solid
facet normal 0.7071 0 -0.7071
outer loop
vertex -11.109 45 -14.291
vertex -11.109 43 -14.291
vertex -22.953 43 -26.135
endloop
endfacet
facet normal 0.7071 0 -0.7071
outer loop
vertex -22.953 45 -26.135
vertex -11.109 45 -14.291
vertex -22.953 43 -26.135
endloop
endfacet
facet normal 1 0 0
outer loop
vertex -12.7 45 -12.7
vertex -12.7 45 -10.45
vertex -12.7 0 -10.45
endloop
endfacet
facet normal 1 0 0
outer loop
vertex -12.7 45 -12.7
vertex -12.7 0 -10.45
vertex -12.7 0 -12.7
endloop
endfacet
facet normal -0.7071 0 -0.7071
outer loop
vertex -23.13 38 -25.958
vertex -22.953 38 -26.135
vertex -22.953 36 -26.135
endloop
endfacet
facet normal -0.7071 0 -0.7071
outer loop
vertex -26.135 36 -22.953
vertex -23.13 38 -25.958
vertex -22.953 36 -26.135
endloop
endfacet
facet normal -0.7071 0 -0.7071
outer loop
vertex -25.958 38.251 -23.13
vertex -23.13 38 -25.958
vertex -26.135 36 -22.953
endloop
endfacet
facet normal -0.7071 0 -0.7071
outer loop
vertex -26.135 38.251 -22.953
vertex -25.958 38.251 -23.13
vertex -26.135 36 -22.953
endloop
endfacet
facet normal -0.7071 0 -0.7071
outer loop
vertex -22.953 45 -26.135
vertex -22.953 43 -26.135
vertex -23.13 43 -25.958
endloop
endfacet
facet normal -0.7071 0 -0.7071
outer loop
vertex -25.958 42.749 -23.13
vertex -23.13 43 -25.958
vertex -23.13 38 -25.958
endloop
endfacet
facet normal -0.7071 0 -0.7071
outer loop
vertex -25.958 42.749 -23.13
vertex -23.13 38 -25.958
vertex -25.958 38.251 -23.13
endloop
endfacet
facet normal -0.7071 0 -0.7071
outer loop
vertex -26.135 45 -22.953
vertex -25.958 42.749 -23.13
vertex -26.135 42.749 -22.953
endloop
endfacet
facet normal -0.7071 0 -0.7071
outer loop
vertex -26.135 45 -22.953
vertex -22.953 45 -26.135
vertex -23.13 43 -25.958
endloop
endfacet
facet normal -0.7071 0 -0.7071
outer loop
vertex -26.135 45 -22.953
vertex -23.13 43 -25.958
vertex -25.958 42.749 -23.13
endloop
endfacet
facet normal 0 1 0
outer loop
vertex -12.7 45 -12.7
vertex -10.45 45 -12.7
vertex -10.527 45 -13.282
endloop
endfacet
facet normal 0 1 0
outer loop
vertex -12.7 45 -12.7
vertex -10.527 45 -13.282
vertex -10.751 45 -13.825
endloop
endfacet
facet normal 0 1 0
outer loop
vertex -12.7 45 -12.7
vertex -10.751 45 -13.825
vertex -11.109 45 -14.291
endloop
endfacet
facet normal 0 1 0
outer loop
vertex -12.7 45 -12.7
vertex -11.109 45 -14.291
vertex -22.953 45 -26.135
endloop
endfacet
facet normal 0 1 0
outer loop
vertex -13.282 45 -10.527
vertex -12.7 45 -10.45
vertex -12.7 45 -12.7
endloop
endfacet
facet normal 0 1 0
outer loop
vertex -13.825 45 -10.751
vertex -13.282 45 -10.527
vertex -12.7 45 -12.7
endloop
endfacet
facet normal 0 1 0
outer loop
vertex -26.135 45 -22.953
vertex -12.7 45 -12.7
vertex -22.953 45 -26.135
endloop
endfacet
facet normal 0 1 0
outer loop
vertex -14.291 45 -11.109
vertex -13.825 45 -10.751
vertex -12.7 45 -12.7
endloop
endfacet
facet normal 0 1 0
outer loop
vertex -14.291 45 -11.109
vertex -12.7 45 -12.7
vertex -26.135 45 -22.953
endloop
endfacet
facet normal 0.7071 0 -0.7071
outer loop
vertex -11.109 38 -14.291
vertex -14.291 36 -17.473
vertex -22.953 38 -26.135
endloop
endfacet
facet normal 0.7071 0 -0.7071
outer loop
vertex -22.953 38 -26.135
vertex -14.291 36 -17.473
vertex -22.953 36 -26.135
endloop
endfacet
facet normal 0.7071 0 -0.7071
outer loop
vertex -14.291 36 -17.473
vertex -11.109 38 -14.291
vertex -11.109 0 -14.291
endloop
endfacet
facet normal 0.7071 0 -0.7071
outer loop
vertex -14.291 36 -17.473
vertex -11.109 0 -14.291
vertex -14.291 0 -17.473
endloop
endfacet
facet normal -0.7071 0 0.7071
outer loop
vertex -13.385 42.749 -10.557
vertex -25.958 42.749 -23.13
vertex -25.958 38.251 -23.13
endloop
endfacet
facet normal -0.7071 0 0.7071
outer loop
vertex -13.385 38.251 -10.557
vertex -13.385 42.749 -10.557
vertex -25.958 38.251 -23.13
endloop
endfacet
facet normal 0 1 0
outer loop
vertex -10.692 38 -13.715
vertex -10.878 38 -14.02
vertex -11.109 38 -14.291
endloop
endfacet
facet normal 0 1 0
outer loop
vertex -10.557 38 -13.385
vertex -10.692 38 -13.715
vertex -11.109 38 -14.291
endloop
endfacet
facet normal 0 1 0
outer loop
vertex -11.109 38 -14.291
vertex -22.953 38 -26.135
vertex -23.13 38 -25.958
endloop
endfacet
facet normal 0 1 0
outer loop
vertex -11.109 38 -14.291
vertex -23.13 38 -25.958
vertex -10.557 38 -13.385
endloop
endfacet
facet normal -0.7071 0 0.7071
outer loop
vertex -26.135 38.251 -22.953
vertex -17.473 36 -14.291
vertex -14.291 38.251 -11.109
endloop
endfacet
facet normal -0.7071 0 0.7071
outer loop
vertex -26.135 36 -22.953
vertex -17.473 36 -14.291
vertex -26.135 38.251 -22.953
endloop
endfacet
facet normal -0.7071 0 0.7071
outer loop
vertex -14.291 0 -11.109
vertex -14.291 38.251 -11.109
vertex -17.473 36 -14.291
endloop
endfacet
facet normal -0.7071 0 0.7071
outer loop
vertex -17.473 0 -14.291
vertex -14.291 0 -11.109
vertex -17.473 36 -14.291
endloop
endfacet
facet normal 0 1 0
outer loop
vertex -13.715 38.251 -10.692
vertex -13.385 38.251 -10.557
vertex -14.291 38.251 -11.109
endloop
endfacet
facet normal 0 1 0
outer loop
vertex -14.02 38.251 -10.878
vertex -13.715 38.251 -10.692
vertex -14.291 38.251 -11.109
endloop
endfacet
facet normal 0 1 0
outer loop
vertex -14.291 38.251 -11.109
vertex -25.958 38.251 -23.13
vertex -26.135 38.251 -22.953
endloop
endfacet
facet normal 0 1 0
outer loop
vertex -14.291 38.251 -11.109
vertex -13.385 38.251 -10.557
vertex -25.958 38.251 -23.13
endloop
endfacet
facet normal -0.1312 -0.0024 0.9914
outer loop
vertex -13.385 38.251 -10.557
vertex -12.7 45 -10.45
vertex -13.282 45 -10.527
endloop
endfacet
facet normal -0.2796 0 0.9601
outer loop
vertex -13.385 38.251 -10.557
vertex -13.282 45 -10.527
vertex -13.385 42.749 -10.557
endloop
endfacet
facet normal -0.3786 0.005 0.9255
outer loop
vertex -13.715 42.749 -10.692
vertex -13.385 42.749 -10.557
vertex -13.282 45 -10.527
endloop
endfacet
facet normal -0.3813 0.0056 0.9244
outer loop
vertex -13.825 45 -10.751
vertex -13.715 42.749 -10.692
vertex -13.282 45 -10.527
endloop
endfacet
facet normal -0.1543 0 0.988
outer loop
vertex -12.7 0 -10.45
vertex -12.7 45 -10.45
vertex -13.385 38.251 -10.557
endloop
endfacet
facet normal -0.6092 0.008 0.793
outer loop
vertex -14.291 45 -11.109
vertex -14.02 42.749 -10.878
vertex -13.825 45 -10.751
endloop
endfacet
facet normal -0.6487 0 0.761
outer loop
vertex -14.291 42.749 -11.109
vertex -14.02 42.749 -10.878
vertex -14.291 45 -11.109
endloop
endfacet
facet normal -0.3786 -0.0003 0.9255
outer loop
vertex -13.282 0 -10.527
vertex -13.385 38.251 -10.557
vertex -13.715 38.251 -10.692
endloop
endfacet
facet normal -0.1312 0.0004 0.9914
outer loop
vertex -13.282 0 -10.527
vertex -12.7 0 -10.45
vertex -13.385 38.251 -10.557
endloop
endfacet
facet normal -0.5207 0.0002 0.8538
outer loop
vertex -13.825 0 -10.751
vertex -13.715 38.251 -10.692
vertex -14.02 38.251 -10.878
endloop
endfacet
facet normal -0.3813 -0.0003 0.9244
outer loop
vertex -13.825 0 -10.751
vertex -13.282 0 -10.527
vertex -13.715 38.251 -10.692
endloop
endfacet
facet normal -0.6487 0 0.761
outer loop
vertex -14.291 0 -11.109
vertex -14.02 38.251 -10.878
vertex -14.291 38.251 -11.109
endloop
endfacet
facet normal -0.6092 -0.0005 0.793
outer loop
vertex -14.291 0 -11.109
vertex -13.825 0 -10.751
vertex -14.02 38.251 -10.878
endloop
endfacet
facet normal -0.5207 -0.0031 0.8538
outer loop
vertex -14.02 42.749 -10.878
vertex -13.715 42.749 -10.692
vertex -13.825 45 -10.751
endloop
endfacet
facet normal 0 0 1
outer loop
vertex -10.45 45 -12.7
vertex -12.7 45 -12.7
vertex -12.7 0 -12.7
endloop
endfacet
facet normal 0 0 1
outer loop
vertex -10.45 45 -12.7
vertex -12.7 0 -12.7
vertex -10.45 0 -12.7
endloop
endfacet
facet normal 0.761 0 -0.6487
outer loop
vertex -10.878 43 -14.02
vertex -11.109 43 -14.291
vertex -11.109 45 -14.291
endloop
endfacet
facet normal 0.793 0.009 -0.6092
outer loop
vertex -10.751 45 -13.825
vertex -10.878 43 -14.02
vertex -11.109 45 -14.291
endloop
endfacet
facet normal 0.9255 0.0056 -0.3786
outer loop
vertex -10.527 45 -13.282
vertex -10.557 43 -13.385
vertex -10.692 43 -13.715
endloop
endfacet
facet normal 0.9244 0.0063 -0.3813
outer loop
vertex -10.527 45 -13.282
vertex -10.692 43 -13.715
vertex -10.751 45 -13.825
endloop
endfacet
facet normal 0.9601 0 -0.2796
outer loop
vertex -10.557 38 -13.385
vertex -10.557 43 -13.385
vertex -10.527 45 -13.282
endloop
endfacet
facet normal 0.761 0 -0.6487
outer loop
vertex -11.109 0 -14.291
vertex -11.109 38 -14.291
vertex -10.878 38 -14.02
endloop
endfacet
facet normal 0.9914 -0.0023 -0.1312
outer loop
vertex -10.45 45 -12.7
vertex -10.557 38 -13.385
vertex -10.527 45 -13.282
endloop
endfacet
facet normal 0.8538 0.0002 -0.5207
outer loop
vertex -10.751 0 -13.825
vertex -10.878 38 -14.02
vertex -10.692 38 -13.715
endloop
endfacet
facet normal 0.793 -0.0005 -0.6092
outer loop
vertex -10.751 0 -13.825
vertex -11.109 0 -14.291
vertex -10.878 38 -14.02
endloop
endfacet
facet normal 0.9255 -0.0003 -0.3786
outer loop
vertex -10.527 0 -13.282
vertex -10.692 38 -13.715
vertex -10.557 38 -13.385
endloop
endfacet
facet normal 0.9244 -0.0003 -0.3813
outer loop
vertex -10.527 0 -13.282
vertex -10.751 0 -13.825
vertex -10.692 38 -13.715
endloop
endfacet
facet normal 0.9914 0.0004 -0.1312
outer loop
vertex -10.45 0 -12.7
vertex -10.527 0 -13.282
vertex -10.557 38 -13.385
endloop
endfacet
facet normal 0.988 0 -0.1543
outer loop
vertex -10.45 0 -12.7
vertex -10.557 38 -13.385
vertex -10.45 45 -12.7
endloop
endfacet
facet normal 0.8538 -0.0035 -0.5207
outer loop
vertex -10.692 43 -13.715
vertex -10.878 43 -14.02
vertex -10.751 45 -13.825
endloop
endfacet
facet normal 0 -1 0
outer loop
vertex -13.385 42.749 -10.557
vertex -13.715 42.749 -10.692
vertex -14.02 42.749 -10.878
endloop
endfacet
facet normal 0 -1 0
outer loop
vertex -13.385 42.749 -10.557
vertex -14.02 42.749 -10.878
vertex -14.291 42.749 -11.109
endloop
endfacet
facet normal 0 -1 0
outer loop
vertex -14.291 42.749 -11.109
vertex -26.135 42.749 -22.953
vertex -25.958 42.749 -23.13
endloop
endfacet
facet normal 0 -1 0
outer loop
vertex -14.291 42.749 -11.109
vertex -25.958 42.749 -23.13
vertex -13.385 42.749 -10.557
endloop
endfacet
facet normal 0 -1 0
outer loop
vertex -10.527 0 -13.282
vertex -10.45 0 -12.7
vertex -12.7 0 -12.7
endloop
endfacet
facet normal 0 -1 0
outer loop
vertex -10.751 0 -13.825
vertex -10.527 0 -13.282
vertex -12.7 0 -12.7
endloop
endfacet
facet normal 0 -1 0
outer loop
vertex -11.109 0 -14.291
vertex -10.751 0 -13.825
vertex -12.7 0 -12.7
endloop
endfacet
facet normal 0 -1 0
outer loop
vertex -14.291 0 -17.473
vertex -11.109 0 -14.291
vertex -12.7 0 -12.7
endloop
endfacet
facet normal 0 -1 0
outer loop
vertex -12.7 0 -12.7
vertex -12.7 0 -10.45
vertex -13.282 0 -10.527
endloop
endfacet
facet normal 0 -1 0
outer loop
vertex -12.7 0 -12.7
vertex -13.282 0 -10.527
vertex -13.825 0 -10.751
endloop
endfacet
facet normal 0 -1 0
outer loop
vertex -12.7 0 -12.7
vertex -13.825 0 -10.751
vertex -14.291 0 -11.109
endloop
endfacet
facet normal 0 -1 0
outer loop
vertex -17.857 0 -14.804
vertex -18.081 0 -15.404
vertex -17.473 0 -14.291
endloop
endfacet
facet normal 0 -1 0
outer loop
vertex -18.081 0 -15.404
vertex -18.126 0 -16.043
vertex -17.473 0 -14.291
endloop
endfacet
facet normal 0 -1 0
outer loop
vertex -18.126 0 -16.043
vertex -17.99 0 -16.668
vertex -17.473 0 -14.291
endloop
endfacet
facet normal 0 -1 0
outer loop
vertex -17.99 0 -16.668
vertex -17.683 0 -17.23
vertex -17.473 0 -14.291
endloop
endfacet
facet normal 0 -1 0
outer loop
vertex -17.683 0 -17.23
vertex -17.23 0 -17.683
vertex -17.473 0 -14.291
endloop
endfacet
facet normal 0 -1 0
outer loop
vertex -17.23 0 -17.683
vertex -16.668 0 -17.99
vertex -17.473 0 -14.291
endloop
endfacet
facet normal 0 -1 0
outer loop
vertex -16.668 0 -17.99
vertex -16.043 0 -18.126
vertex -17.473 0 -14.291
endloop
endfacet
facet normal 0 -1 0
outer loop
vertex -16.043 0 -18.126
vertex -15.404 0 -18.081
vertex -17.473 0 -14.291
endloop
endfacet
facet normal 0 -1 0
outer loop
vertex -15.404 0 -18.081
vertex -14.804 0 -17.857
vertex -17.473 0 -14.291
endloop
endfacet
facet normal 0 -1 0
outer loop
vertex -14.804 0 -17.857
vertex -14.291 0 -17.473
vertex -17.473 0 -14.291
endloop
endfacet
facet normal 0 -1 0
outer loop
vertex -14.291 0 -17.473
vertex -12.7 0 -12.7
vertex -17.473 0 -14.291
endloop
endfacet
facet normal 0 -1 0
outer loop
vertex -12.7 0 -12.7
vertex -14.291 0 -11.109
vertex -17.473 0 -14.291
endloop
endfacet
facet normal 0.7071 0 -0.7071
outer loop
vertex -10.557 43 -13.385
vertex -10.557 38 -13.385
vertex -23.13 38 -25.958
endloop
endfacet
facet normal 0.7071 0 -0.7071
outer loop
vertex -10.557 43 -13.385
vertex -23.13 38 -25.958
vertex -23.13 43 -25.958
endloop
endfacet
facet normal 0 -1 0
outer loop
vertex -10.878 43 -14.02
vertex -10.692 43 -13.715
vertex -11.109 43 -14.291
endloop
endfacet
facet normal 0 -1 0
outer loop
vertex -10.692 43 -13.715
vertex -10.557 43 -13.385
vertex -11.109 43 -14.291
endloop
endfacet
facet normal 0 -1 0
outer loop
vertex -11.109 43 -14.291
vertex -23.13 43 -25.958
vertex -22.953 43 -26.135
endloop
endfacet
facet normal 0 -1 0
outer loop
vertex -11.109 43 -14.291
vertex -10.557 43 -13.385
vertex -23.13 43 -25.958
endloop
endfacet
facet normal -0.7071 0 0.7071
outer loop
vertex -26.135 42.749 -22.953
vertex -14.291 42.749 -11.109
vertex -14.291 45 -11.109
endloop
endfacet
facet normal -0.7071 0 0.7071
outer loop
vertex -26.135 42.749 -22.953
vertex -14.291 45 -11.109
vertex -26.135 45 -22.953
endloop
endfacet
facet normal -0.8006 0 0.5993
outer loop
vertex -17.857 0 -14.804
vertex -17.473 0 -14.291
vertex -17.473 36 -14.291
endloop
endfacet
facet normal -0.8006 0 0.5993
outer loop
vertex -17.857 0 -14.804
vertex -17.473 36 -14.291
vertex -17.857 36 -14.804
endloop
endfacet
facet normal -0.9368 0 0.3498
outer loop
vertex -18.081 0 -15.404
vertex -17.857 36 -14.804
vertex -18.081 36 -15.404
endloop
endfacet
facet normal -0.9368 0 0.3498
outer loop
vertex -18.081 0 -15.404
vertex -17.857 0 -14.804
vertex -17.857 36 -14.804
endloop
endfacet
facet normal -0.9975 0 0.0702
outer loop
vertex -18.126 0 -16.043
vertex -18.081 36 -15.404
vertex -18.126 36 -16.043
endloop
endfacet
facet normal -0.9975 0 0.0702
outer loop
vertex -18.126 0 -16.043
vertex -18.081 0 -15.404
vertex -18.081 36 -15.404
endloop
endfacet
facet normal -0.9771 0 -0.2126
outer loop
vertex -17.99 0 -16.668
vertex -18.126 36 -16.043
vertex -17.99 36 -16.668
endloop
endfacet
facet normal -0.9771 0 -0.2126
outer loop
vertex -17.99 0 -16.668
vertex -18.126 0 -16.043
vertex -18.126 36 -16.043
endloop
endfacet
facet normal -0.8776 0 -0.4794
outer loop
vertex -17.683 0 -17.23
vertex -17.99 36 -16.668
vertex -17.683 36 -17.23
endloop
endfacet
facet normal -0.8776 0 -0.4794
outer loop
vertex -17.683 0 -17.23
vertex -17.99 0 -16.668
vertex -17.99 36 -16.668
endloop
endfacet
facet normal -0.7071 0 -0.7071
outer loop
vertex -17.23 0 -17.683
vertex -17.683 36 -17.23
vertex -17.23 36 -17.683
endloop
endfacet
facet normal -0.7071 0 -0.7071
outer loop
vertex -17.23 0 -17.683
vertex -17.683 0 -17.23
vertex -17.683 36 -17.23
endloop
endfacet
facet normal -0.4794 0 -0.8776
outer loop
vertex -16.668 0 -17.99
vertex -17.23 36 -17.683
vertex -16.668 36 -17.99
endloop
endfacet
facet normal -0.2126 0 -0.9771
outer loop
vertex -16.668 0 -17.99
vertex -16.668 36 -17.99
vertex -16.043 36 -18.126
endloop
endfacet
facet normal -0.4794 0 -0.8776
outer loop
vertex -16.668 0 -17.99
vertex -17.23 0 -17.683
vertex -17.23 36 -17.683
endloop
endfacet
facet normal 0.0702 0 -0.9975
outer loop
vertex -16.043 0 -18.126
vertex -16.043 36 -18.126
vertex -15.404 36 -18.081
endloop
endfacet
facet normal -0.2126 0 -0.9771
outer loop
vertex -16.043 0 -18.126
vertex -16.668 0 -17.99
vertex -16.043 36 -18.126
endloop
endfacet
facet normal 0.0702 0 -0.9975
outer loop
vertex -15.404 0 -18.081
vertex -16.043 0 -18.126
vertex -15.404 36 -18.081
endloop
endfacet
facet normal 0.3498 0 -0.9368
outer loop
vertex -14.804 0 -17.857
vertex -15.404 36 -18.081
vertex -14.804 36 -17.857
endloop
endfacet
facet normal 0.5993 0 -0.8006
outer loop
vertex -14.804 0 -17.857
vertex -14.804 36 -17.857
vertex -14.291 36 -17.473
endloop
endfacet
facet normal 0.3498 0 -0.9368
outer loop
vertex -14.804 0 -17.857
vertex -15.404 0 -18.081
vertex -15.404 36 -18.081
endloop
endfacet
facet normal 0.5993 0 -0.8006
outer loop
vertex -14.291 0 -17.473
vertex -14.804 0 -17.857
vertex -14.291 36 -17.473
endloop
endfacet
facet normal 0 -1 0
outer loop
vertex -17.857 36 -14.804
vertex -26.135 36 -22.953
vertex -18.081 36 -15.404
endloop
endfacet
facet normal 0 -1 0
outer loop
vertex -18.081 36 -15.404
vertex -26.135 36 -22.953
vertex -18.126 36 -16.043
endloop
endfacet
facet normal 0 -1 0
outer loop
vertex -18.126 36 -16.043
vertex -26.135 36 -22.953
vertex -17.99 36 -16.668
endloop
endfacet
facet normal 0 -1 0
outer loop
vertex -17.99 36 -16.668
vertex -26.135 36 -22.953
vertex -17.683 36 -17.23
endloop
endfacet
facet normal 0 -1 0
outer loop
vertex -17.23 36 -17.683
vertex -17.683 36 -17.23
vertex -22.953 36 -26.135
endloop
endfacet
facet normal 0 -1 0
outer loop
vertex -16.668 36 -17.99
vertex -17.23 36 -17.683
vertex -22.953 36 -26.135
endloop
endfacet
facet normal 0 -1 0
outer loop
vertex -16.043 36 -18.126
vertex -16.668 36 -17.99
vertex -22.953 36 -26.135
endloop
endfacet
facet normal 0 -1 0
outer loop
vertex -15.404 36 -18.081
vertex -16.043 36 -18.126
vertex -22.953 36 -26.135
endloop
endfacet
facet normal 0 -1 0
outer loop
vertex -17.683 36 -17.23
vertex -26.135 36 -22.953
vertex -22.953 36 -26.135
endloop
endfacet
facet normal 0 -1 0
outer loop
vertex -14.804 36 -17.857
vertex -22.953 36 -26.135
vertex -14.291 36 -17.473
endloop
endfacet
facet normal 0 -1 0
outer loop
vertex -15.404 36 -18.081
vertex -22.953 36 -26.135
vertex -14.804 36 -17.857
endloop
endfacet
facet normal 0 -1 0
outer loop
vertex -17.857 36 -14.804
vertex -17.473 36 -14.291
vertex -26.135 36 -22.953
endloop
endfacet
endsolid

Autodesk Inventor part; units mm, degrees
ref_plane "YZ Plane" through (0, 0, 0) normal (1, 0, 0) x (0, 1, 0)
ref_plane "XZ Plane" through (0, 0, 0) normal (0, 1, 0) x (-1, 0, 0)
ref_plane "XY Plane" through (0, 0, 0) normal (0, 0, 1) x (1, 0, 0)
sketch "Sketch1" plane through (0, 0, 0) normal (0, 1, 0) x (-1, 0, 0)
  line L0 (-12.7, -12.7) -> (10.45, -12.7)
  line L1 (12.7, -10.45) -> (12.7, 12.7)
  line L2 (12.7, 12.7) -> (-12.7, 12.7)
  line L3 (-12.7, 12.7) -> (-12.7, -12.7)
  line L4 (-12.7, -12.7) -> (12.7, 12.7) construction
  line L5 (12.7, -12.7) -> (-12.7, 12.7) construction
  line L6 (17.473, -17.473) -> (23.3066, -23.3066)
  arc A0 (14.291, -17.473) -> (17.473, -14.291) centre (15.882, -15.882) ccw
  line L7 (14.291, -11.109) -> (17.473, -14.291)
  line L8 (11.109, -14.291) -> (14.291, -17.473)
  line L9 (12.7, -10.45) -> (12.7, -12.7)
  line L10 (12.7, -12.7) -> (10.45, -12.7)
  arc A1 (14.291, -11.109) -> (12.7, -10.45) centre (12.7, -12.7) ccw
  arc A2 (10.45, -12.7) -> (11.109, -14.291) centre (12.7, -12.7) ccw
  point P0 (0, 0)
  point P1 (15.882, -15.882)
  dimension "d0" = 25.4
extrude "Extrusion1" add sketch "Sketch1" along normal blind 45 contours L10 L9 A1 L7 A0 L8 A2
sketch "Sketch2" plane through (0, 45, 0) normal (0, 1, 0) x (1, 0, 0)
  arc A0 (-14.291, 11.109) -> (-12.7, 10.45) centre (-12.7, 12.7) ccw projected
  line L0 (-12.7, 10.45) -> (-12.7, 12.7) projected
  line L1 (-12.7, 12.7) -> (-10.45, 12.7) projected
  arc A1 (-10.45, 12.7) -> (-11.109, 14.291) centre (-12.7, 12.7) ccw projected
  line L2 (-11.109, 14.291) -> (-14.291, 17.473) projected
  arc A2 (-14.291, 17.473) -> (-17.473, 14.291) centre (-15.882, 15.882) ccw projected
  line L3 (-17.473, 14.291) -> (-14.291, 11.109) projected
  line L4 (-17.473, 17.473) -> (-15.882, 19.064)
  arc A3 (-14.291, 17.473) -> (-17.473, 14.291) centre (-15.882, 15.882) ccw projected
  line L5 (-15.882, 19.064) -> (-19.064, 15.882)
  line L6 (-19.064, 15.882) -> (-14.291, 11.109)
  line L7 (-14.291, 11.109) -> (-11.109, 14.291)
  line L8 (-11.109, 14.291) -> (-15.882, 19.064)
  line L9 (-19.064, 15.882) -> (-26.135, 22.953)
  line L10 (-15.882, 19.064) -> (-22.953, 26.135)
  line L11 (-22.953, 26.135) -> (-26.135, 22.953)
  point P0 (0, 0)
  dimension "d10" = 10
extrude "Extrusion2" add sketch "Sketch2" against normal blind 9 contours L3 A2 L2 L7 | L6 L5 A2 | L4 L8 A2 | L5 L9 L11 L10 L4
sketch "Sketch3" plane through (-22.953, 36, -26.135) normal (-0.7071, 0, -0.7071) x (-0.7071, 0, 0.7071)
  line L0 (0, 0) -> (4.5, 0) projected
  line L1 (4.5, 9) -> (4.5, 0)
  line L2 (4.5, -36) -> (4.5, 9) projected
  line L3 (0, 9) -> (4.5, 9) projected
  line L4 (4.25, 2.2514) -> (4.75, 2.2514)
  line L5 (4.75, 2.2514) -> (4.75, 6.7486)
  line L6 (4.75, 6.7486) -> (4.25, 6.7486)
  line L7 (4.25, 6.7486) -> (4.25, 2.2514)
  line L8 (4.25, 2.2514) -> (4.75, 6.7486) construction
  line L9 (4.75, 2.2514) -> (4.25, 6.7486) construction
  line L10 (-0.25, 2) -> (0.25, 2)
  line L11 (0.25, 2) -> (0.25, 7)
  line L12 (0.25, 7) -> (-0.25, 7)
  line L13 (-0.25, 7) -> (-0.25, 2)
  line L14 (0, -36) -> (0, 9) projected
  line L15 (-0.25, 2) -> (0.25, 7) construction
  line L16 (0.25, 2) -> (-0.25, 7) construction
  line L17 (4.5, 6.7486) -> (4.5, 2.2514)
  line L18 (0, 2) -> (0, 7)
  point P0 (2.25, -36)
  point P1 (4.5, 4.5)
  point P2 (0, 4.5)
  dimension "d13" = 9
  dimension "d14" = 4.5
  dimension "d15" = 4.5
  dimension "d16" = 0.5
  dimension "d17" = 0.5
  dimension "d18" = 5
extrude "Extrusion3" cut sketch "Sketch3" against normal blind 21.7 contours L14 L12 L11 L10 | L10 L13 L12 L14 | L4 L7 L6 L1 | L1 L6 L5 L4
properties part number "Gripper_Gen3_FingerRail"
